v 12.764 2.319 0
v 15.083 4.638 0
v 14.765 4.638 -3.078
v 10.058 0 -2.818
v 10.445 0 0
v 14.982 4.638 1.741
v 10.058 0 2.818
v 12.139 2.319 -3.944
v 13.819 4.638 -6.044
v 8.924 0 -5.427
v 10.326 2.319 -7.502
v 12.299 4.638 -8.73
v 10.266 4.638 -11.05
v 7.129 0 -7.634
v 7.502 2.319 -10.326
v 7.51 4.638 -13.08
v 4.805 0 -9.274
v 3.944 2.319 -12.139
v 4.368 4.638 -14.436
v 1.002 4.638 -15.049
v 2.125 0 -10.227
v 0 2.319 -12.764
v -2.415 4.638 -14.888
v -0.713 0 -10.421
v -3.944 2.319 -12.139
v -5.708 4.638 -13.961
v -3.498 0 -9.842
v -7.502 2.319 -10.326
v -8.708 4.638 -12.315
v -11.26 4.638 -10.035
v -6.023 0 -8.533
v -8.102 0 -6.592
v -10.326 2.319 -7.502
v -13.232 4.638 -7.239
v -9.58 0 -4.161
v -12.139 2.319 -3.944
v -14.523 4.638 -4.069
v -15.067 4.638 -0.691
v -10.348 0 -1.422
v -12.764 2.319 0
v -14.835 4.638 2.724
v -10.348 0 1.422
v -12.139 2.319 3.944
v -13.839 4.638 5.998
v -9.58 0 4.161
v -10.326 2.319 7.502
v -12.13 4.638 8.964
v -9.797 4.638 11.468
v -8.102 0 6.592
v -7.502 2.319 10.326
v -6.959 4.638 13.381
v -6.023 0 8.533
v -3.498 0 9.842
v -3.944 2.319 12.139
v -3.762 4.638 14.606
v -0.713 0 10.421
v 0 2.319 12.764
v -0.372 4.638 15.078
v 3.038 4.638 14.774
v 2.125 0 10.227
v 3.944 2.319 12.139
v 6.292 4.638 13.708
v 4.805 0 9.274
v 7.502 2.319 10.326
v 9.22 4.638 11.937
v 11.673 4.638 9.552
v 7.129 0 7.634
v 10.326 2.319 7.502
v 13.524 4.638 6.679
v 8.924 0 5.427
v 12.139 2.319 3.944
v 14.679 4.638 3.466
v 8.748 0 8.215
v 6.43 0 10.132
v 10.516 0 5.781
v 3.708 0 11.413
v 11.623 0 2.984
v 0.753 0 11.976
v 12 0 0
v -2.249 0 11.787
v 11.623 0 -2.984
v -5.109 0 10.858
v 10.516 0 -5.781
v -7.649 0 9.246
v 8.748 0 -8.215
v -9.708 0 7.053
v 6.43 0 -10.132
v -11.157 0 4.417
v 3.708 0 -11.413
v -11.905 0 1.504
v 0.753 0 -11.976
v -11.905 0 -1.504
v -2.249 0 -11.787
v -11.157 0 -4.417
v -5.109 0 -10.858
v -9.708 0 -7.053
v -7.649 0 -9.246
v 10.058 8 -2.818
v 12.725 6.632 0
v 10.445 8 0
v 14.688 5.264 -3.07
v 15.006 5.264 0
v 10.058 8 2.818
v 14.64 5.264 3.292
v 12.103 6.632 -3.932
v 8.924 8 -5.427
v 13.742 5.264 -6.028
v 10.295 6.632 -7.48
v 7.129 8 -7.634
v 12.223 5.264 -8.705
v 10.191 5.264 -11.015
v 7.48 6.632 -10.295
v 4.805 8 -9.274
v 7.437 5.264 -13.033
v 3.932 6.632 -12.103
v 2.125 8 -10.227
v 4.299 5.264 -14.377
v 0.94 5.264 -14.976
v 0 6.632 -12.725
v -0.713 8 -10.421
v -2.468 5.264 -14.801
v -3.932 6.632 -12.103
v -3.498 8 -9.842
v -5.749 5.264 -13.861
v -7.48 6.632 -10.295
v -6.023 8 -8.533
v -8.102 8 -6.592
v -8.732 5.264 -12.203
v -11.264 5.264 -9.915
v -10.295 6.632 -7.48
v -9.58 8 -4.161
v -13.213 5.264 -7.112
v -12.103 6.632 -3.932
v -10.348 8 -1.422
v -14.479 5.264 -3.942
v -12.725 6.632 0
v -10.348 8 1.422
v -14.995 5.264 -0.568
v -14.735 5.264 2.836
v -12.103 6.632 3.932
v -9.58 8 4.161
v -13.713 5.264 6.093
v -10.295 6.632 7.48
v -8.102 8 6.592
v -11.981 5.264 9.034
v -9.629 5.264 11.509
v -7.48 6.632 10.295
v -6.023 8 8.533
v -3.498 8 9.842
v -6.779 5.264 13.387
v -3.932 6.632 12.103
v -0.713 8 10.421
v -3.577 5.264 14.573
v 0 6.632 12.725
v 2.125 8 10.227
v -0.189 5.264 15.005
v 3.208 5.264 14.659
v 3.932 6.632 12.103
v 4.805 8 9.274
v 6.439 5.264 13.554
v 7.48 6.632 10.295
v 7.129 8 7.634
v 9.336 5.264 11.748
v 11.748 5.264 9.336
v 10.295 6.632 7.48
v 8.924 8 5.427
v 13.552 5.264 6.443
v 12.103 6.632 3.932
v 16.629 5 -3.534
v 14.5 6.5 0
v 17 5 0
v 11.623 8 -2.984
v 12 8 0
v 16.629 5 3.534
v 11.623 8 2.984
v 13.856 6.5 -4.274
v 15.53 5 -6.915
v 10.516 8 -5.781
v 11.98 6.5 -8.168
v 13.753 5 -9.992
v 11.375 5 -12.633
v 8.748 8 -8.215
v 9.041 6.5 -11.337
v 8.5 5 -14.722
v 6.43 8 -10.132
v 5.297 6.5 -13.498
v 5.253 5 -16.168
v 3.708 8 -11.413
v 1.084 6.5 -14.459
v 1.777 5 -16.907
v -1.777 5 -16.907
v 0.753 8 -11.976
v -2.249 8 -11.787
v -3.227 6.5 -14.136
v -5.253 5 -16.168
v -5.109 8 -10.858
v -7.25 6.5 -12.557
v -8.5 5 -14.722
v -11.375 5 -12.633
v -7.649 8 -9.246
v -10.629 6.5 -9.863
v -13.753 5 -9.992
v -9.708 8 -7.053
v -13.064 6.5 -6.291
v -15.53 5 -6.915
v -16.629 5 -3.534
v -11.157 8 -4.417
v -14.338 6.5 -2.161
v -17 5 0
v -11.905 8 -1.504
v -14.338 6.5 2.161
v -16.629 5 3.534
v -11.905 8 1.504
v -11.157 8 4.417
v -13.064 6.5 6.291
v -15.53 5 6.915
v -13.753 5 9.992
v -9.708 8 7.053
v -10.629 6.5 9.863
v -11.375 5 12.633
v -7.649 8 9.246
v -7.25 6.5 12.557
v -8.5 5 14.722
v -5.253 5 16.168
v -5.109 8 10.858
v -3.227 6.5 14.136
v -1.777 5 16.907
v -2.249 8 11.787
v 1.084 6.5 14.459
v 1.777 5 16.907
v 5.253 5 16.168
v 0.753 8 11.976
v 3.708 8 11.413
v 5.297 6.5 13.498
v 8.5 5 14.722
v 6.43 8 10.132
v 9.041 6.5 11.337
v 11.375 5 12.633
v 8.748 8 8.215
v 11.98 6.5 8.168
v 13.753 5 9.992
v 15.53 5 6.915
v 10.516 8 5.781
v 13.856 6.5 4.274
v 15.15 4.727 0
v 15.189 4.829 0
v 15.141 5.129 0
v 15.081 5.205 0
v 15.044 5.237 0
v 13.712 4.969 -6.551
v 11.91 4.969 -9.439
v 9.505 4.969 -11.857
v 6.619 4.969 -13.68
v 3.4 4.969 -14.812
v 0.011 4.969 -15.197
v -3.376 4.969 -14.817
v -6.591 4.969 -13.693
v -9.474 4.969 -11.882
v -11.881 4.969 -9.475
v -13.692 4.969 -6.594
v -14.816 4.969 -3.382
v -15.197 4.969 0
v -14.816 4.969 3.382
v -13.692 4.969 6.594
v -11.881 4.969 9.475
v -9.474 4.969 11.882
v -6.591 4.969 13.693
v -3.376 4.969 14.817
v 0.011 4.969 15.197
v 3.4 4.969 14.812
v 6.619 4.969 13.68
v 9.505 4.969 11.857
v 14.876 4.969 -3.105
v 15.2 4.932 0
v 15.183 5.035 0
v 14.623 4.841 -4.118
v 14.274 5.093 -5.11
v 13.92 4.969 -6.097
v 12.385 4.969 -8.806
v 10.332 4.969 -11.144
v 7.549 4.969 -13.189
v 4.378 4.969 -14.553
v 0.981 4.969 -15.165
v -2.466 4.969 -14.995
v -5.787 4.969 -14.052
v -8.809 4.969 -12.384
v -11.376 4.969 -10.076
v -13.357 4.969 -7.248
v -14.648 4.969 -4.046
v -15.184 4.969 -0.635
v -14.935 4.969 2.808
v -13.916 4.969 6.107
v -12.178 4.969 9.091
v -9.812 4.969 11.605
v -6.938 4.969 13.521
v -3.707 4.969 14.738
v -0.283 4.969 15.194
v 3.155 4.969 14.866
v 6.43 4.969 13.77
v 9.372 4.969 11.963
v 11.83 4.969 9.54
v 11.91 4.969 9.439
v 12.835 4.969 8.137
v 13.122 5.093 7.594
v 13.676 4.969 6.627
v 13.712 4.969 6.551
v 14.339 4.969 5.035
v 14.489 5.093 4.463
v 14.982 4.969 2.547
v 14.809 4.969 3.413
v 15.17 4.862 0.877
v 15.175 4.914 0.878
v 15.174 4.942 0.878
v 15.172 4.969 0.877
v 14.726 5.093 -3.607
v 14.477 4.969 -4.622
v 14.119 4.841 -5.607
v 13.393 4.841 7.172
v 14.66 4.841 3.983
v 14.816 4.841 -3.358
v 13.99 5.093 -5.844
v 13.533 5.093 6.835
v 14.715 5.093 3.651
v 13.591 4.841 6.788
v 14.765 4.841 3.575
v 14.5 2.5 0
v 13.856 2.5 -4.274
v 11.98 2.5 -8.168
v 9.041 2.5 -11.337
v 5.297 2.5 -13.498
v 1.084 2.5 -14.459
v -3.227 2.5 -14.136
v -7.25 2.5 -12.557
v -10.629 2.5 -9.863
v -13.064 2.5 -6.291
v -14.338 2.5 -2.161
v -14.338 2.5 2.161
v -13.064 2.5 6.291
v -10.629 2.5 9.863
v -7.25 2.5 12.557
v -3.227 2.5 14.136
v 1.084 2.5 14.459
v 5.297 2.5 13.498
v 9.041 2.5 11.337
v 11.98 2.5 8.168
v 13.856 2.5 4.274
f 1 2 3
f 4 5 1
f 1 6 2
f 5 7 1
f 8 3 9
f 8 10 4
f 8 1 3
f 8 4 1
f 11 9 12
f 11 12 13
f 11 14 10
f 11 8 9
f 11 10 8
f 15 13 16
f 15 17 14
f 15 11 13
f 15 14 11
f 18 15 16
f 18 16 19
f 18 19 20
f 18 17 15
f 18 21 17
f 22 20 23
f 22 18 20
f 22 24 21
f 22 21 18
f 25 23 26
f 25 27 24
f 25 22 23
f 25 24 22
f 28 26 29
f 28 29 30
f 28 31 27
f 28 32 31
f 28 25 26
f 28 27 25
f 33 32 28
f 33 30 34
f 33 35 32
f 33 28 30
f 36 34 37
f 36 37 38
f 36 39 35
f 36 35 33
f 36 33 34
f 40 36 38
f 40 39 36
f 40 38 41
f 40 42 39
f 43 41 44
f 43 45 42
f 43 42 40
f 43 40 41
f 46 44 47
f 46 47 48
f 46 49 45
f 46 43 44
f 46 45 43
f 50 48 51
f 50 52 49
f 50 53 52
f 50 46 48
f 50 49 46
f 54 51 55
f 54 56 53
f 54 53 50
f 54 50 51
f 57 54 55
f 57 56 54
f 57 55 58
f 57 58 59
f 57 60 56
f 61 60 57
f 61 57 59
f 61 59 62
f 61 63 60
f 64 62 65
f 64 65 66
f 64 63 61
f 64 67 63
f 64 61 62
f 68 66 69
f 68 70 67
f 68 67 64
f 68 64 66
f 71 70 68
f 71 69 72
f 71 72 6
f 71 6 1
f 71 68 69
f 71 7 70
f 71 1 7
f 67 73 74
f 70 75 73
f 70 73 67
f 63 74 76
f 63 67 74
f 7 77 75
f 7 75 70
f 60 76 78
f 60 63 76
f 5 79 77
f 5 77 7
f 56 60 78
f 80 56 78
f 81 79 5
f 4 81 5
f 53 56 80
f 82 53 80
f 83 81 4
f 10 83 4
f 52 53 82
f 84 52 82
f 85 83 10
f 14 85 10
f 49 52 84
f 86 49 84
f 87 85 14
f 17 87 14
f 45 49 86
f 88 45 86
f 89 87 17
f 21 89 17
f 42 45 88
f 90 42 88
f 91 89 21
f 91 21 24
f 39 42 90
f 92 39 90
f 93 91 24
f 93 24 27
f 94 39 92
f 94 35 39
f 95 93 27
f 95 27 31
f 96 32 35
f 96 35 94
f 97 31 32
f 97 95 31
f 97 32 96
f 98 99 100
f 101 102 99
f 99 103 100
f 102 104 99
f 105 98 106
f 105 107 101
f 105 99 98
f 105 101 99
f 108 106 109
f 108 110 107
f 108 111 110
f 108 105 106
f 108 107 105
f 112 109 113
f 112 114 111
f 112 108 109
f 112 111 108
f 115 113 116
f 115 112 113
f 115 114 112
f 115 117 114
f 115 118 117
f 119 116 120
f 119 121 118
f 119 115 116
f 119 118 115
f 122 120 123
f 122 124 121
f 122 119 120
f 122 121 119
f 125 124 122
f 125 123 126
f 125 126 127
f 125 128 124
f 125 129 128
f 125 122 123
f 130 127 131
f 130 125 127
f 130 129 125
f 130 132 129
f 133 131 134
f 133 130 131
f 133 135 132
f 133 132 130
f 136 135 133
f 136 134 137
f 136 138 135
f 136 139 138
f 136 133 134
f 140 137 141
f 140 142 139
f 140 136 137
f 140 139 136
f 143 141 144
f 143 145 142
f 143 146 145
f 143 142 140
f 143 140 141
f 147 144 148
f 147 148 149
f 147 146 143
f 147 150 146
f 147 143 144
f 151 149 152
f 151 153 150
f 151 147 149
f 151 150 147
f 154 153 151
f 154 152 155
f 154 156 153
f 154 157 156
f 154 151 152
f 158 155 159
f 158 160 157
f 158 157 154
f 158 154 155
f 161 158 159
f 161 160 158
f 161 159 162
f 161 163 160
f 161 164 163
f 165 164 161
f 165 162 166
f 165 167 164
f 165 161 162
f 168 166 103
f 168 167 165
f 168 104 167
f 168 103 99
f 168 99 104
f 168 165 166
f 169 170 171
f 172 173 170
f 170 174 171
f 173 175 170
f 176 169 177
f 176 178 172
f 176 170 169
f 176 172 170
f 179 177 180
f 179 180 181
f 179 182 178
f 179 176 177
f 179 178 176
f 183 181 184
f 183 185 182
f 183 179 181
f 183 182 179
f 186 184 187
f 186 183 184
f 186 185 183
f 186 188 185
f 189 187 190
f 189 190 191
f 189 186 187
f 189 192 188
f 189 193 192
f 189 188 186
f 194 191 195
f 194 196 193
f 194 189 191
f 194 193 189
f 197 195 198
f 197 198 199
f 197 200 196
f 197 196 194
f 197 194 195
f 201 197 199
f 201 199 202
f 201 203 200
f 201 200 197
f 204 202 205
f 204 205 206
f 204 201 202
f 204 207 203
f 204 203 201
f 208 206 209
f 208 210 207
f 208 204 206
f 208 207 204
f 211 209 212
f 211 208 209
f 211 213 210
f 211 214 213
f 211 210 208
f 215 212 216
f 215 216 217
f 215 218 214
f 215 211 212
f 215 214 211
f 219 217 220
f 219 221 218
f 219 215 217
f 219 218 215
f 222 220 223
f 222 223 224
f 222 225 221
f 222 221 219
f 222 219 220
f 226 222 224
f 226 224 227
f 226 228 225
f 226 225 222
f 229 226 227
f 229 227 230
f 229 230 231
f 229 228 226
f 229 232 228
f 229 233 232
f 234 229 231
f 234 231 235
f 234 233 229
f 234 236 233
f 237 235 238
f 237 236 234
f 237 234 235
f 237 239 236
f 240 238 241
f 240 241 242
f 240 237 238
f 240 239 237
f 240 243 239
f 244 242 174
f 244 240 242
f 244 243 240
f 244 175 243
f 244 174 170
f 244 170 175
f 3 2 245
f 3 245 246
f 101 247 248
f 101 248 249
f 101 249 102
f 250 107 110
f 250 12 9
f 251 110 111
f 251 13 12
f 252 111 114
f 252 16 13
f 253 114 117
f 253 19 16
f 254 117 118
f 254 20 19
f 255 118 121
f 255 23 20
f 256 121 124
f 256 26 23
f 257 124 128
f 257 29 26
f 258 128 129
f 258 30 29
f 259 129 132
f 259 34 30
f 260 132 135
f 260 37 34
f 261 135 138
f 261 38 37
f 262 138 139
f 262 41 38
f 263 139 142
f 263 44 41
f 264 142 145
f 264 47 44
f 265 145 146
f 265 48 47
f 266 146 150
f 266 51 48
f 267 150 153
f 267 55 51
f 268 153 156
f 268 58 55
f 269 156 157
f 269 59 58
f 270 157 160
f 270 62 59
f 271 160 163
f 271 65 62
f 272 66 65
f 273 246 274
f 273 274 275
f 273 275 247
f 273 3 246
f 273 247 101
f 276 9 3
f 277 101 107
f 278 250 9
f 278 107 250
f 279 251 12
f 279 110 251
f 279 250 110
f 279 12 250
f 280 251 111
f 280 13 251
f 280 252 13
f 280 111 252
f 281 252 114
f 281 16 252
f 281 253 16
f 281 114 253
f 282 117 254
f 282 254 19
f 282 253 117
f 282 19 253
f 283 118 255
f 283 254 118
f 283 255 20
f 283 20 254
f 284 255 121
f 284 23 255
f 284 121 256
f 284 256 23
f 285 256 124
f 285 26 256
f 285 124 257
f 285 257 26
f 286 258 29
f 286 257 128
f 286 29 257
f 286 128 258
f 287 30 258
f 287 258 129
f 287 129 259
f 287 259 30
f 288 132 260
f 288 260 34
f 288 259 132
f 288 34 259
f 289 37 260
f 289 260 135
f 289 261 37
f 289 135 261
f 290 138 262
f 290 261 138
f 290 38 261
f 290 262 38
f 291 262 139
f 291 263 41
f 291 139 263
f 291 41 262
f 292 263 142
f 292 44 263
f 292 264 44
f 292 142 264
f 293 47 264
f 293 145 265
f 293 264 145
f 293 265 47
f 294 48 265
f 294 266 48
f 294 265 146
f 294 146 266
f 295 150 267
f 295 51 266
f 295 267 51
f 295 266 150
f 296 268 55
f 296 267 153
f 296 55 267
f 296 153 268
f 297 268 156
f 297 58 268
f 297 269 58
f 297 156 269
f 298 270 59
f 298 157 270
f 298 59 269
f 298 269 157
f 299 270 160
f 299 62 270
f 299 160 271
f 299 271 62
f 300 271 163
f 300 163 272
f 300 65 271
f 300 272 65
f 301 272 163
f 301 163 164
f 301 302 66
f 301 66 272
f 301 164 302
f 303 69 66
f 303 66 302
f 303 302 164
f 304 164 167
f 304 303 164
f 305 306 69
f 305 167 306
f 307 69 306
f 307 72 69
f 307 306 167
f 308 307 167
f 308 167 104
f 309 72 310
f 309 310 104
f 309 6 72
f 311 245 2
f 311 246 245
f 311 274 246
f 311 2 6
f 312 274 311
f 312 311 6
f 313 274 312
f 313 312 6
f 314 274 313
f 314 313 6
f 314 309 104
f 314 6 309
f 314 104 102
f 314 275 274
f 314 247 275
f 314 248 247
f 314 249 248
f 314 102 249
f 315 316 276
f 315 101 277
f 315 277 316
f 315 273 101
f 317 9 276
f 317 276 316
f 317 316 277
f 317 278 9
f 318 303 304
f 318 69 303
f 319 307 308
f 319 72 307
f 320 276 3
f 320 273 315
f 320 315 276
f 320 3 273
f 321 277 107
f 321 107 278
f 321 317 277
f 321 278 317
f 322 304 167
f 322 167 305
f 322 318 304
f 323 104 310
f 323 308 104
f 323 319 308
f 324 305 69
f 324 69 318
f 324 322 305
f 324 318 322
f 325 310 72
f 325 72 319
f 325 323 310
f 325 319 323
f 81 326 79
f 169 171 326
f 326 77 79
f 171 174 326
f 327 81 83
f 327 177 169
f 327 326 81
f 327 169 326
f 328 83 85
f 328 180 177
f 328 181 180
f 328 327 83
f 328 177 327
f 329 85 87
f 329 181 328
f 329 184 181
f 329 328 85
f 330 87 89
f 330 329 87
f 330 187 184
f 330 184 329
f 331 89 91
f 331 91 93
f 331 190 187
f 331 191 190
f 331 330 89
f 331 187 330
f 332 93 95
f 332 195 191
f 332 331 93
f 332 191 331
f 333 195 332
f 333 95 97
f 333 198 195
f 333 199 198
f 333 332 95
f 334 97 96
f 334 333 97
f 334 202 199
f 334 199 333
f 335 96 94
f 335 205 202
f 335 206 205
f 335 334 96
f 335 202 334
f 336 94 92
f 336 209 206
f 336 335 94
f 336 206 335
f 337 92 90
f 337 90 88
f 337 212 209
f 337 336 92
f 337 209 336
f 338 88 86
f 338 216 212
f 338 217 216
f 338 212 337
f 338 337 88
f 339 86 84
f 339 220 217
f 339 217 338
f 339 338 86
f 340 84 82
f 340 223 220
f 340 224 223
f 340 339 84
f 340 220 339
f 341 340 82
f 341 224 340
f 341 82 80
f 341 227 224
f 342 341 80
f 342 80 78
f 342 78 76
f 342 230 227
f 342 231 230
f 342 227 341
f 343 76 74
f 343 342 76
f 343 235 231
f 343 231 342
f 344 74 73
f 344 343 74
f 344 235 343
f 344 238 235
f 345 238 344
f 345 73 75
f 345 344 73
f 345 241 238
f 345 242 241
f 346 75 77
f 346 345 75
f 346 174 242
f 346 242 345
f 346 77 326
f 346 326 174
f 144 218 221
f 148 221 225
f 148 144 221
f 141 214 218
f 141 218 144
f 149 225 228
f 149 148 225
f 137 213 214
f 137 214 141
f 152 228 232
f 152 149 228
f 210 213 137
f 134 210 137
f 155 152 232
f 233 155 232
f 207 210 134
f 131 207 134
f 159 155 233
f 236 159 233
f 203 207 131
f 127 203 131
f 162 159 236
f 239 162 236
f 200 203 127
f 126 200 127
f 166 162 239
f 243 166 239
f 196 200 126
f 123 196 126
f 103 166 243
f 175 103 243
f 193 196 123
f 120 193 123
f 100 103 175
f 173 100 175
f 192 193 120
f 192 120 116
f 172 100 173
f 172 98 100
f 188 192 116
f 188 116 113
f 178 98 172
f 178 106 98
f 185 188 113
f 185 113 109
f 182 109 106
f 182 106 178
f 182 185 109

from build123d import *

# Parameters (mm, degrees)
FILLET1_R = 0.4


# Read off the part's stored shape, not the designer's step: Revolve1
with BuildPart() as part:
    # Revolve1 outline → Revolve1 (revolve)
    with BuildSketch(Plane.XY):
        Polygon((15.445079495, 5), (10.445079495, 0), (12, 0), (17, 5), (12, 8), (10.445079495, 8), align=None)
    revolve(axis=Axis((0, 0, 0), (0, 1, 0)))

    # Fillet1
    fillet1_edges = [part.edges().sort_by_distance(p)[0] for p in [
        (-15.445079495, 5, 0),
    ]]
    fillet(fillet1_edges, radius=FILLET1_R)


solid = part.part
